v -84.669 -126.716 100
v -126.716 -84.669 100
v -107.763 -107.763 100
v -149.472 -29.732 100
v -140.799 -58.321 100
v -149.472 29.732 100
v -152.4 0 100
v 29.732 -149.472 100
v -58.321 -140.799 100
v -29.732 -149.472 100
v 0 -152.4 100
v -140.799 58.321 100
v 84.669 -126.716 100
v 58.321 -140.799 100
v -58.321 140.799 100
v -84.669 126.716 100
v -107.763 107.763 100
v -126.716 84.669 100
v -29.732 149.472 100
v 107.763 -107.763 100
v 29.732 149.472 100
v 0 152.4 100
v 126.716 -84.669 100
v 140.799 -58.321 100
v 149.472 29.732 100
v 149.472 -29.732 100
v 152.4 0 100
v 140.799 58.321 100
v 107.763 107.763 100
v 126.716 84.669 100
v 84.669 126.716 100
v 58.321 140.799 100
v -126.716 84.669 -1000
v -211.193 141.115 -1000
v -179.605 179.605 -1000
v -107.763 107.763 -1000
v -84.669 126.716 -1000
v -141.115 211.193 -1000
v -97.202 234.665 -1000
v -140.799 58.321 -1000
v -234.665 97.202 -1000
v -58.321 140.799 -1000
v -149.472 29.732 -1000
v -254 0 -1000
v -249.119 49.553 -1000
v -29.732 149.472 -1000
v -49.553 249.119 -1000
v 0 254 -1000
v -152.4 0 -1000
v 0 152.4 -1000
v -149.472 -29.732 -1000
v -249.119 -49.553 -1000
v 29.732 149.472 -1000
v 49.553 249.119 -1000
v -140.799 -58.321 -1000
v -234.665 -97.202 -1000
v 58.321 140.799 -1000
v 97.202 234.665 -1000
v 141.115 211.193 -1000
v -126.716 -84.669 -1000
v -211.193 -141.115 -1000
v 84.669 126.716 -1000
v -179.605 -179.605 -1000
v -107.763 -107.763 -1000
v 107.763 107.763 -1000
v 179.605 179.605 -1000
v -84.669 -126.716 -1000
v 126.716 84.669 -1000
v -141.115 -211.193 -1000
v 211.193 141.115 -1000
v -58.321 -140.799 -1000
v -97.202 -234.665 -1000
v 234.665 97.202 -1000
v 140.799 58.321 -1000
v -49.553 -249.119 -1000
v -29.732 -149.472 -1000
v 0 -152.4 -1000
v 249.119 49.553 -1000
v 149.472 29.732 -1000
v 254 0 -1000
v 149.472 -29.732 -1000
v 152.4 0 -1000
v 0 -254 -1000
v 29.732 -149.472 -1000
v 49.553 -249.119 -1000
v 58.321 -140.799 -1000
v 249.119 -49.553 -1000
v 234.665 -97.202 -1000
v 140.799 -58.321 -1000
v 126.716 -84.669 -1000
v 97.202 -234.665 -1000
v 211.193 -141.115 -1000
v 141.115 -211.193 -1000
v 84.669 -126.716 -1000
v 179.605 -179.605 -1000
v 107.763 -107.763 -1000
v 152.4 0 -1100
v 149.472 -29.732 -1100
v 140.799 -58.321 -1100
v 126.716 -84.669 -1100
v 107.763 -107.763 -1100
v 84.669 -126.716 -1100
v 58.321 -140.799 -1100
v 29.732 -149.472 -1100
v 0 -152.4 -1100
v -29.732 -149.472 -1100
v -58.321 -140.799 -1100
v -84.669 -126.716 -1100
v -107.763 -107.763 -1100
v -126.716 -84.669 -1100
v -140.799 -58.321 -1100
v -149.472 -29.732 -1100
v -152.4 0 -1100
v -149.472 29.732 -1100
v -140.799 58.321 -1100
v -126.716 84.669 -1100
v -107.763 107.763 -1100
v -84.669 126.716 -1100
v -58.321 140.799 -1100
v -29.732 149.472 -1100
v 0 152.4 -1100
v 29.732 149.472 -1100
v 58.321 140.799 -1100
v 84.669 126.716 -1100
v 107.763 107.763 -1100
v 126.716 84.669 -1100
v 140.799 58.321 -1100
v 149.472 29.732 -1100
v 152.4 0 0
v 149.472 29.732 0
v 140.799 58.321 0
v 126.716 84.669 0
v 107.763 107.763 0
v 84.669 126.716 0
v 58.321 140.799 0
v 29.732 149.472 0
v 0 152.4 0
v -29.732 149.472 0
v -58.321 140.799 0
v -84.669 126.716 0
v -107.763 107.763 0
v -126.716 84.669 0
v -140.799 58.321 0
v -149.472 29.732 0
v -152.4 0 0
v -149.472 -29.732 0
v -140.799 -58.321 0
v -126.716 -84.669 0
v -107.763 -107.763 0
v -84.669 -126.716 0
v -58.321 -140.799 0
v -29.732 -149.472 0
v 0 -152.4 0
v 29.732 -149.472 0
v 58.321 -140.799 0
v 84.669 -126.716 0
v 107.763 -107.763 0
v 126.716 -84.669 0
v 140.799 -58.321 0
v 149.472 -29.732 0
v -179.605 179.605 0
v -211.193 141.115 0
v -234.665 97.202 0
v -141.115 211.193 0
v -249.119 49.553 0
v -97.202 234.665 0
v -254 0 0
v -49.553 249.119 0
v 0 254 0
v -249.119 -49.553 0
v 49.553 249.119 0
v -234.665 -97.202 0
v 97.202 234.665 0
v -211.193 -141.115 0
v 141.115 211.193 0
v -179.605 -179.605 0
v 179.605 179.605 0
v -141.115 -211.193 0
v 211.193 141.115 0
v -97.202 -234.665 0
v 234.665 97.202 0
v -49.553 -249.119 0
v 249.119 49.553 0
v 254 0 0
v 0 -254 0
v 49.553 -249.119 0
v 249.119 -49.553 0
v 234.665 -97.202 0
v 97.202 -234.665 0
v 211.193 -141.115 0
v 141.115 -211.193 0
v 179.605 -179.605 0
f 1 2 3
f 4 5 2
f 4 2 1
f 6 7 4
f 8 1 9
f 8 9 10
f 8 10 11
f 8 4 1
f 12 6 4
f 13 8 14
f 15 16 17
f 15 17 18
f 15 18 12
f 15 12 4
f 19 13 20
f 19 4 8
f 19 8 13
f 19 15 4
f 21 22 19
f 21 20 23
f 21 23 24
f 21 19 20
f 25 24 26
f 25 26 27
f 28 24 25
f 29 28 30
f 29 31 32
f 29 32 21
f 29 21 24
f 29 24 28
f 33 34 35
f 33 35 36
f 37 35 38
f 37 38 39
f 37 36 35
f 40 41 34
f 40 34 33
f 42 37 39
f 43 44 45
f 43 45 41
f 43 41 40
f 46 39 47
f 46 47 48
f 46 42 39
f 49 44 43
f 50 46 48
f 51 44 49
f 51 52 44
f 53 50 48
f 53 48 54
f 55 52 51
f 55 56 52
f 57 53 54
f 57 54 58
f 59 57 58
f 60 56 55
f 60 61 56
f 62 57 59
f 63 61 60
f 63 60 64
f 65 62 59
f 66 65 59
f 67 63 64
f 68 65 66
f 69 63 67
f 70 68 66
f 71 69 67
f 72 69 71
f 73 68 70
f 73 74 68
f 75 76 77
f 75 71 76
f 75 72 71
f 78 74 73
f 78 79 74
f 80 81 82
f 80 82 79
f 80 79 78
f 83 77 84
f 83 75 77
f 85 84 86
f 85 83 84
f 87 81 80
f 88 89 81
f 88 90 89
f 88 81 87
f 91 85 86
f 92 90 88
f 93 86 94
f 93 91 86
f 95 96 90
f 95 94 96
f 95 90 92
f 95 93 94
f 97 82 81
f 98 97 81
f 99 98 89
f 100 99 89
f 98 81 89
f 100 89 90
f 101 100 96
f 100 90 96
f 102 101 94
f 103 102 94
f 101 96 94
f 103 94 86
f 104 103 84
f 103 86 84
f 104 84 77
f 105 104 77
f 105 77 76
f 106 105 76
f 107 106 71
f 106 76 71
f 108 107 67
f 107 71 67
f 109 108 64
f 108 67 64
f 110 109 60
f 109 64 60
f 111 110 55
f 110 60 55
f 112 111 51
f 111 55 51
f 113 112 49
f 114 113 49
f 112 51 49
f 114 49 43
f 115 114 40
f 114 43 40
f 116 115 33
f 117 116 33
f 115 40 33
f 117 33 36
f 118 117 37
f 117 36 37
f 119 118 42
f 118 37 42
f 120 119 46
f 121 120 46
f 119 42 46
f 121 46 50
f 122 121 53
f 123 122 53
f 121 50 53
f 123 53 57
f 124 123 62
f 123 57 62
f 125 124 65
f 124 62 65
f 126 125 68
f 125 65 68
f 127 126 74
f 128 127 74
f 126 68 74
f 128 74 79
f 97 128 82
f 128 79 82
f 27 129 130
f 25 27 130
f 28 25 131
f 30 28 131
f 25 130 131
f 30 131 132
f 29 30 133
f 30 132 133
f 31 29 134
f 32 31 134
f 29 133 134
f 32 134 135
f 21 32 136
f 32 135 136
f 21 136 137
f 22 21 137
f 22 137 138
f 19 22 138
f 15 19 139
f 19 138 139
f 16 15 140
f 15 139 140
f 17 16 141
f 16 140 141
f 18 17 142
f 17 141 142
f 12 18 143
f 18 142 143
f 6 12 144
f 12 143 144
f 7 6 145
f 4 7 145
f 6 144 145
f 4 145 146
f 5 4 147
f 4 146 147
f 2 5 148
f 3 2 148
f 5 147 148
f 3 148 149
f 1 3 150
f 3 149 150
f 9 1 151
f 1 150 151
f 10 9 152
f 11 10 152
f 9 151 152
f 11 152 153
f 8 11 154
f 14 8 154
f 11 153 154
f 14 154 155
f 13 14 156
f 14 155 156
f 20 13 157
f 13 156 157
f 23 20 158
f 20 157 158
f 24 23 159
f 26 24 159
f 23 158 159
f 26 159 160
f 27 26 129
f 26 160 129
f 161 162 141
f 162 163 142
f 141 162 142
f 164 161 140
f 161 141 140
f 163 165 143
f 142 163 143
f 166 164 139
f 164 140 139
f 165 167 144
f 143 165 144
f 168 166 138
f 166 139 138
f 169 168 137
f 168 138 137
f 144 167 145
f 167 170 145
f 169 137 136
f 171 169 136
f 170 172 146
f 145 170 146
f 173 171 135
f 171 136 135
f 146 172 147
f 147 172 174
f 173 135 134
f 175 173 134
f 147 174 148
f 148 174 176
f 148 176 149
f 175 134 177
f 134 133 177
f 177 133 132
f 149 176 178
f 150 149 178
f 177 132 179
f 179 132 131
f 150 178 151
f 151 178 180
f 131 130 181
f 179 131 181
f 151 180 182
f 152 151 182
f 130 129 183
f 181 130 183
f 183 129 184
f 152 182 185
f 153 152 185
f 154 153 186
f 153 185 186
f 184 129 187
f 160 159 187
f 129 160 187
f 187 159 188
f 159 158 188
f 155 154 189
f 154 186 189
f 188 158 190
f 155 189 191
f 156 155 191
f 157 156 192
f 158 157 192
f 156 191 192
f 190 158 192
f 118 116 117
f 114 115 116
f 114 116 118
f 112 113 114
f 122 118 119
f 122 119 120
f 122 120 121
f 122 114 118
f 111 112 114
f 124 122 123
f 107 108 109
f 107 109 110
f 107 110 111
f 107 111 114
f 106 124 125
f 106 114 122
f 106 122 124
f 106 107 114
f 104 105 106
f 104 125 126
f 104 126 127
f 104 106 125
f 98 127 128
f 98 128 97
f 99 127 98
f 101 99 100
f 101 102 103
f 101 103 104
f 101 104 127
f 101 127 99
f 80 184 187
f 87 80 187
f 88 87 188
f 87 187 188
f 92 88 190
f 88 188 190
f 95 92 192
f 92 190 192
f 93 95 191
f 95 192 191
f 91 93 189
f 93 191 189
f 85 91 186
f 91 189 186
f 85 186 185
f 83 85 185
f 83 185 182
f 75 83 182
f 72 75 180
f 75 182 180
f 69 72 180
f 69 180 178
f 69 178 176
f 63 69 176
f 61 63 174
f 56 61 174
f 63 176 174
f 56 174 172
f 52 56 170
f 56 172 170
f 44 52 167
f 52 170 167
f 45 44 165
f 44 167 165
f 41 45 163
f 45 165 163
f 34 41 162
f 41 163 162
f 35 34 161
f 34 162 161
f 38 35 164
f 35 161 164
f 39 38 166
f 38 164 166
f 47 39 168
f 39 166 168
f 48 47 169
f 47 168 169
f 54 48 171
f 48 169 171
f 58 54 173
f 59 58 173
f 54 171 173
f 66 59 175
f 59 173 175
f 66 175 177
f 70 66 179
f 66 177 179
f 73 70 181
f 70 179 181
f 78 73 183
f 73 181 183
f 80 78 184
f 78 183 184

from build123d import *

# Parameters (mm, degrees)
F0_R     = 152.4
F1_DEPTH = 100
F2_R     = 254
F2_R_2   = 152.4
F3_DEPTH = 1000
F4_R     = 152.4
F5_DEPTH = 100


with BuildPart() as f1:
    # F0 (on Top) → F1 (new body)
    with BuildSketch(Plane.XY):
        Circle(F0_R)
    extrude(amount=F1_DEPTH)

    # F2 (on face) → F3 (join)
    with BuildSketch(Plane(origin=(0, 0, 0), x_dir=(1, 0, 0), z_dir=(0, 0, -1))):
        Circle(F2_R)
        Circle(F2_R_2, mode=Mode.SUBTRACT)
        Circle(F2_R_2)
    extrude(amount=F3_DEPTH)

    # F4 (on face) → F5 (join)
    with BuildSketch(Plane(origin=(0, 0, -1000), x_dir=(1, 0, 0), z_dir=(0, 0, -1))):
        Circle(F4_R)
    extrude(amount=F5_DEPTH)


solid = f1.part
